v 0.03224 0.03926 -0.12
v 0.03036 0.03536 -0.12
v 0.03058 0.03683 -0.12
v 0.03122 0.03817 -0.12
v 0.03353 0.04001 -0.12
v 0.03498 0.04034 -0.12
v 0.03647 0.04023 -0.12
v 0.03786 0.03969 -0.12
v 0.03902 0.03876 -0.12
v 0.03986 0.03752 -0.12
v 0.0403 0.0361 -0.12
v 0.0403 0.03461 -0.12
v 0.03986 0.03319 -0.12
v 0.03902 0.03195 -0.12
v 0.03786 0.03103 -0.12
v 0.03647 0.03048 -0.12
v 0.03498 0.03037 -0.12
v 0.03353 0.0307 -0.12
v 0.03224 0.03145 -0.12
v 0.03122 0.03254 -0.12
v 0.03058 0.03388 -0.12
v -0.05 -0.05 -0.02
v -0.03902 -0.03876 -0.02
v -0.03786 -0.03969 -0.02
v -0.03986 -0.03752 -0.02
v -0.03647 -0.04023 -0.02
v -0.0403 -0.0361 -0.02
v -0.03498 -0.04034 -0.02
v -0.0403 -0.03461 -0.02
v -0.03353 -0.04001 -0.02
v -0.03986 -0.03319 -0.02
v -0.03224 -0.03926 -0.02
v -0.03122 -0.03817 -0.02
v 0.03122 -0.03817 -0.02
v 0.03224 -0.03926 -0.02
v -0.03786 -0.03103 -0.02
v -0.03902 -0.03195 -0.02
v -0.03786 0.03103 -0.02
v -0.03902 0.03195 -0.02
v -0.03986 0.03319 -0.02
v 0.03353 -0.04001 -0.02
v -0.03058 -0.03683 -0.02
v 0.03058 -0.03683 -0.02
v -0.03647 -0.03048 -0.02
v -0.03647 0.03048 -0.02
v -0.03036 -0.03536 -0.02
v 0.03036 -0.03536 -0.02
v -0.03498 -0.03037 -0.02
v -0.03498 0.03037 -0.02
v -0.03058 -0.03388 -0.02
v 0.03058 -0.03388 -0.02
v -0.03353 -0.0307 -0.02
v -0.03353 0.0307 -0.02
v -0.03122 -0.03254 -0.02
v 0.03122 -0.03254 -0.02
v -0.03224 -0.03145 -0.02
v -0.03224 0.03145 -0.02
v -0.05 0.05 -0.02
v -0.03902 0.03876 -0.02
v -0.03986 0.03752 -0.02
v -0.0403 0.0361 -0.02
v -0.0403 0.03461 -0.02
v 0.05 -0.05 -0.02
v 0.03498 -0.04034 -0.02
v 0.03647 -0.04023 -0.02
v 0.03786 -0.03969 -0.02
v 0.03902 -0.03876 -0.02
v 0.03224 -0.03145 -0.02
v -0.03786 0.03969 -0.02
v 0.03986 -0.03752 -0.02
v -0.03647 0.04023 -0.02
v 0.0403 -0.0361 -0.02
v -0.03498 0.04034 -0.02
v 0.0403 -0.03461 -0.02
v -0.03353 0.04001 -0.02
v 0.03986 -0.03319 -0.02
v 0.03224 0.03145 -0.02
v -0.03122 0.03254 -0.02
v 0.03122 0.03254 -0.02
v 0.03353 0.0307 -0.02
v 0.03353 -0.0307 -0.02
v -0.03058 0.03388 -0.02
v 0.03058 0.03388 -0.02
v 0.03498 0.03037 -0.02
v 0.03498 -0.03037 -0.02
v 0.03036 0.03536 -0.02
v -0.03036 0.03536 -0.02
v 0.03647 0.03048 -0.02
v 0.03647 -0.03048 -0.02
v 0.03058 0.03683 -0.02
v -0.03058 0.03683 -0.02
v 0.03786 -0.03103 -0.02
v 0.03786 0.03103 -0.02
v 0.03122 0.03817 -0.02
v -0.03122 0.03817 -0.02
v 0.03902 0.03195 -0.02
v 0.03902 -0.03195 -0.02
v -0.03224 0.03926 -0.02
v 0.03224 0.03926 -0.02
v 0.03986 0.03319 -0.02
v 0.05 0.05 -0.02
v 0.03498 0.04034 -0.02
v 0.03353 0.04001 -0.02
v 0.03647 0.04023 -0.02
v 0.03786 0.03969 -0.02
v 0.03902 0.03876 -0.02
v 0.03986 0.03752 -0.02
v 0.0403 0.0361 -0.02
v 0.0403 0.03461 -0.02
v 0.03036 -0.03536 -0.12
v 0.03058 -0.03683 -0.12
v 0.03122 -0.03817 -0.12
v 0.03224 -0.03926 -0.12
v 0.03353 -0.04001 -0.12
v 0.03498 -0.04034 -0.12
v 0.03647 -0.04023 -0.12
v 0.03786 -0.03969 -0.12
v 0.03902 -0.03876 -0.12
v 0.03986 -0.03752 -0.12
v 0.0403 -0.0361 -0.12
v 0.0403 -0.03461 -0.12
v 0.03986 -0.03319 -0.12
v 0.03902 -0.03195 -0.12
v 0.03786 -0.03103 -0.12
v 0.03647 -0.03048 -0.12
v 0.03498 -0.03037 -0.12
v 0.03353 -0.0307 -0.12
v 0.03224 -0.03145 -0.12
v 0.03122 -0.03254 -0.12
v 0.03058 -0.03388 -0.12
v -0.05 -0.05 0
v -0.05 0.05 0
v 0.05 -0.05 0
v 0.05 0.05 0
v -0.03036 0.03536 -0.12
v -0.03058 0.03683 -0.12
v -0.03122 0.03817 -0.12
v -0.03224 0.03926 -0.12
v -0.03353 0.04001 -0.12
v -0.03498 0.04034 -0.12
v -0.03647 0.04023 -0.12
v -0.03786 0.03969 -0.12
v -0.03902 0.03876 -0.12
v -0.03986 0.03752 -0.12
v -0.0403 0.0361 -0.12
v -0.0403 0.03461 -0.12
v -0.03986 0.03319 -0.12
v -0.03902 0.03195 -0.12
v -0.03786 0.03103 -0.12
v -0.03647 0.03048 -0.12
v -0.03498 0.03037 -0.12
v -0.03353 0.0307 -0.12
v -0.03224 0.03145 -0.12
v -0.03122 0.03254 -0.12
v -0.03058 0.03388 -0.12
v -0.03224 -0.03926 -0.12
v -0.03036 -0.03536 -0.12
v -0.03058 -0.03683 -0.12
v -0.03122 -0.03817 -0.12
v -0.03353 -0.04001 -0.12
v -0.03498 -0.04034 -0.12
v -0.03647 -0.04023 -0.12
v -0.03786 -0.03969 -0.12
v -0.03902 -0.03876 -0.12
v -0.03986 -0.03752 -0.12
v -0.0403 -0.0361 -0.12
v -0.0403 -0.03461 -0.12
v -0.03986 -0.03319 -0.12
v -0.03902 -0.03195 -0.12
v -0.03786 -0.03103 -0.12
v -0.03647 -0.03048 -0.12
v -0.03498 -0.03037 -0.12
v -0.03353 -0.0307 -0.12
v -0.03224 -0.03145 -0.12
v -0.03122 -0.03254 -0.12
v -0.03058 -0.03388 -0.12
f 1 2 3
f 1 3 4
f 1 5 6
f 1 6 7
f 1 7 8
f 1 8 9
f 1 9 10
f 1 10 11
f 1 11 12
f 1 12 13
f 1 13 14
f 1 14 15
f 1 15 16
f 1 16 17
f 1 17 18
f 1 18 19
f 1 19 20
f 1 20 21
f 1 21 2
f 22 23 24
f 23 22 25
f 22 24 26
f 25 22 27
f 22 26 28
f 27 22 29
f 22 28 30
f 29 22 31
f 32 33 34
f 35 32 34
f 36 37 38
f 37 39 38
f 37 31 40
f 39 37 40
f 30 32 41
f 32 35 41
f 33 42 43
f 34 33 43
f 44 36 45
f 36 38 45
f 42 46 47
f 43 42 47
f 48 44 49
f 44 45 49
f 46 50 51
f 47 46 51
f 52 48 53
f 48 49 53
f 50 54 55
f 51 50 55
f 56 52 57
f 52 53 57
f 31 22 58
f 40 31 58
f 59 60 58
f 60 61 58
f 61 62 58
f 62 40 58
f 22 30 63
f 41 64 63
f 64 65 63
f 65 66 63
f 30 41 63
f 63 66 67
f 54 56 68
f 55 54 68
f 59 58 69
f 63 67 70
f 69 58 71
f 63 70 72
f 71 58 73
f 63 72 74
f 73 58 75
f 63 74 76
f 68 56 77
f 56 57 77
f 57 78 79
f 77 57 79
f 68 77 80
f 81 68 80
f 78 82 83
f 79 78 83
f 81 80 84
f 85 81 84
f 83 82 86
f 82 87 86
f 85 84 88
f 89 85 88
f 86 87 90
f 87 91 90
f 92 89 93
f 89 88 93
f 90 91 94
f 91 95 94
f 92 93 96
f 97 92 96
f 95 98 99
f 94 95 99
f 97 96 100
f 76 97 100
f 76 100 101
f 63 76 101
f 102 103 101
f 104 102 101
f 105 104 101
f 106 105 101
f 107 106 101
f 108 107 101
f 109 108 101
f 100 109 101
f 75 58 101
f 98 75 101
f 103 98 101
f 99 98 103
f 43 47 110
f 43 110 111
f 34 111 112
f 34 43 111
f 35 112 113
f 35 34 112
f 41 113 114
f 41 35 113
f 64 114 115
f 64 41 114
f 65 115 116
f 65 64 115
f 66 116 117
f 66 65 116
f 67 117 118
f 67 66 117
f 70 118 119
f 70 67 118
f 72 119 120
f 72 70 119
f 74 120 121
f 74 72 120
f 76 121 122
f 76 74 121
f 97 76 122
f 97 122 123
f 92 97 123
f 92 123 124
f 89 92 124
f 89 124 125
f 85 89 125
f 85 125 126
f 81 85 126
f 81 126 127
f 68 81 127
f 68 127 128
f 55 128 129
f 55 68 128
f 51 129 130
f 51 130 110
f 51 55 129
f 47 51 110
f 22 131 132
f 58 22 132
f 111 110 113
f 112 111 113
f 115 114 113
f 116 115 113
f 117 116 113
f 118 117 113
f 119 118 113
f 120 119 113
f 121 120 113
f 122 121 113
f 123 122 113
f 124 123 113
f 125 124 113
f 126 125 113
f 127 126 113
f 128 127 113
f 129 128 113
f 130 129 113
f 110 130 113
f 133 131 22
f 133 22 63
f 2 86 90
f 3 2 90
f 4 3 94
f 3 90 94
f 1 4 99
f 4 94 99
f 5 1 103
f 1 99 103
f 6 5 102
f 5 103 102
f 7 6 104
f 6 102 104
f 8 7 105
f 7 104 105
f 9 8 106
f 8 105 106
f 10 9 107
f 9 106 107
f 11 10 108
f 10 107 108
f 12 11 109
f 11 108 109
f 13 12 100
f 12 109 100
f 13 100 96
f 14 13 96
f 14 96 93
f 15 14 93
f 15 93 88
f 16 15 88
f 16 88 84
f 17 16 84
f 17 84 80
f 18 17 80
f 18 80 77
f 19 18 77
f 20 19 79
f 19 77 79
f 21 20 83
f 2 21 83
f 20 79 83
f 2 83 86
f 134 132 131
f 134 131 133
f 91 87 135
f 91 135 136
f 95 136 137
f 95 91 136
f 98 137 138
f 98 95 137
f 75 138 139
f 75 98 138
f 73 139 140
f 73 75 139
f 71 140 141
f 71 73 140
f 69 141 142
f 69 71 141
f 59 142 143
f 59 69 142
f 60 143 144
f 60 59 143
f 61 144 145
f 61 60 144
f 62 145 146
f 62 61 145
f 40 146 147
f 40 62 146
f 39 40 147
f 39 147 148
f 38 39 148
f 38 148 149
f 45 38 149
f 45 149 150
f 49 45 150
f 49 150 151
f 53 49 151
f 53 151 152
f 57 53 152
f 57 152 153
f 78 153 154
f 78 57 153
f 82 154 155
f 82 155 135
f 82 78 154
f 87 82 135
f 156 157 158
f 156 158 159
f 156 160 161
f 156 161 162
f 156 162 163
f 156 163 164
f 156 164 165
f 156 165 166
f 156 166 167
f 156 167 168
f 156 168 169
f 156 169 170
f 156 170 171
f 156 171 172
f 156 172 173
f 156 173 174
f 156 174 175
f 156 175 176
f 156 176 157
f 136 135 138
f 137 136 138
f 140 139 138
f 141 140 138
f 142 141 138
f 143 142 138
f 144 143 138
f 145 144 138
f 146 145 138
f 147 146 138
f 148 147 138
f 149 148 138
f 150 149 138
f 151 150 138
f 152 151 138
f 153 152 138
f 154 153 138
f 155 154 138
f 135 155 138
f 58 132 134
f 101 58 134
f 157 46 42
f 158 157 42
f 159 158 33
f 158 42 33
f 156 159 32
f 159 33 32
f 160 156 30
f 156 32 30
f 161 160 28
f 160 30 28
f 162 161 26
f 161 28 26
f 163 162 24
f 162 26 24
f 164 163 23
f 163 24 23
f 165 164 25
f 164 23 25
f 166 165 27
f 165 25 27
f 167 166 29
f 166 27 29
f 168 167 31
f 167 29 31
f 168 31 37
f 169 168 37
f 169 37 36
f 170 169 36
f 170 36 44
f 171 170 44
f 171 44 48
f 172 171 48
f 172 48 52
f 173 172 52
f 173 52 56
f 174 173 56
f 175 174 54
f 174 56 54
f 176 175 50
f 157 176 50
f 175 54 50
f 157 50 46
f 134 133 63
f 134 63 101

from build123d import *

# Parameters (mm, degrees)
SKETCH1_W               = 0.1
SKETCH1_H               = 0.1
BOSS_EXTRUDE1_DEPTH     = 0.02
SKETCH3_R               = 0.005
BOSS_EXTRUDE2_DEPTH     = 0.1
MIRROR2_COPY_1_SKETCH_R = 0.005
MIRROR2_COPY_1_DEPTH    = 0.1


with BuildPart() as part:
    # Sketch1 → Boss-Extrude1 (new body)
    with BuildSketch(Plane.XY):
        Rectangle(SKETCH1_W, SKETCH1_H)
    extrude(amount=-BOSS_EXTRUDE1_DEPTH)

    # Sketch3 → Boss-Extrude2 (add)
    with BuildSketch(Plane(origin=(0, 0, -0.02), x_dir=(-1, 0, 0), z_dir=(0, 0, -1))):
        with Locations((-0.035355339, 0.035355339)):
            Circle(SKETCH3_R)
    boss_extrude2 = extrude(amount=BOSS_EXTRUDE2_DEPTH)

    # Mirror1: Boss-Extrude2 across plane
    add(boss_extrude2.mirror(Plane(origin=(0, 0, 0), x_dir=(0, 0, 1), z_dir=(1, 0, 0))))

    # Mirror2: Boss-Extrude2 across plane
    add(boss_extrude2.mirror(Plane.ZX))

    # Mirror2 copy 1 sketch → Mirror2 copy 1 (add)
    with BuildSketch(Plane(origin=(0, 0, -0.02), x_dir=(1, 0, 0), z_dir=(0, 0, -1))):
        with Locations((-0.035355339, 0.035355339)):
            Circle(MIRROR2_COPY_1_SKETCH_R)
    extrude(amount=MIRROR2_COPY_1_DEPTH)


solid = part.part
